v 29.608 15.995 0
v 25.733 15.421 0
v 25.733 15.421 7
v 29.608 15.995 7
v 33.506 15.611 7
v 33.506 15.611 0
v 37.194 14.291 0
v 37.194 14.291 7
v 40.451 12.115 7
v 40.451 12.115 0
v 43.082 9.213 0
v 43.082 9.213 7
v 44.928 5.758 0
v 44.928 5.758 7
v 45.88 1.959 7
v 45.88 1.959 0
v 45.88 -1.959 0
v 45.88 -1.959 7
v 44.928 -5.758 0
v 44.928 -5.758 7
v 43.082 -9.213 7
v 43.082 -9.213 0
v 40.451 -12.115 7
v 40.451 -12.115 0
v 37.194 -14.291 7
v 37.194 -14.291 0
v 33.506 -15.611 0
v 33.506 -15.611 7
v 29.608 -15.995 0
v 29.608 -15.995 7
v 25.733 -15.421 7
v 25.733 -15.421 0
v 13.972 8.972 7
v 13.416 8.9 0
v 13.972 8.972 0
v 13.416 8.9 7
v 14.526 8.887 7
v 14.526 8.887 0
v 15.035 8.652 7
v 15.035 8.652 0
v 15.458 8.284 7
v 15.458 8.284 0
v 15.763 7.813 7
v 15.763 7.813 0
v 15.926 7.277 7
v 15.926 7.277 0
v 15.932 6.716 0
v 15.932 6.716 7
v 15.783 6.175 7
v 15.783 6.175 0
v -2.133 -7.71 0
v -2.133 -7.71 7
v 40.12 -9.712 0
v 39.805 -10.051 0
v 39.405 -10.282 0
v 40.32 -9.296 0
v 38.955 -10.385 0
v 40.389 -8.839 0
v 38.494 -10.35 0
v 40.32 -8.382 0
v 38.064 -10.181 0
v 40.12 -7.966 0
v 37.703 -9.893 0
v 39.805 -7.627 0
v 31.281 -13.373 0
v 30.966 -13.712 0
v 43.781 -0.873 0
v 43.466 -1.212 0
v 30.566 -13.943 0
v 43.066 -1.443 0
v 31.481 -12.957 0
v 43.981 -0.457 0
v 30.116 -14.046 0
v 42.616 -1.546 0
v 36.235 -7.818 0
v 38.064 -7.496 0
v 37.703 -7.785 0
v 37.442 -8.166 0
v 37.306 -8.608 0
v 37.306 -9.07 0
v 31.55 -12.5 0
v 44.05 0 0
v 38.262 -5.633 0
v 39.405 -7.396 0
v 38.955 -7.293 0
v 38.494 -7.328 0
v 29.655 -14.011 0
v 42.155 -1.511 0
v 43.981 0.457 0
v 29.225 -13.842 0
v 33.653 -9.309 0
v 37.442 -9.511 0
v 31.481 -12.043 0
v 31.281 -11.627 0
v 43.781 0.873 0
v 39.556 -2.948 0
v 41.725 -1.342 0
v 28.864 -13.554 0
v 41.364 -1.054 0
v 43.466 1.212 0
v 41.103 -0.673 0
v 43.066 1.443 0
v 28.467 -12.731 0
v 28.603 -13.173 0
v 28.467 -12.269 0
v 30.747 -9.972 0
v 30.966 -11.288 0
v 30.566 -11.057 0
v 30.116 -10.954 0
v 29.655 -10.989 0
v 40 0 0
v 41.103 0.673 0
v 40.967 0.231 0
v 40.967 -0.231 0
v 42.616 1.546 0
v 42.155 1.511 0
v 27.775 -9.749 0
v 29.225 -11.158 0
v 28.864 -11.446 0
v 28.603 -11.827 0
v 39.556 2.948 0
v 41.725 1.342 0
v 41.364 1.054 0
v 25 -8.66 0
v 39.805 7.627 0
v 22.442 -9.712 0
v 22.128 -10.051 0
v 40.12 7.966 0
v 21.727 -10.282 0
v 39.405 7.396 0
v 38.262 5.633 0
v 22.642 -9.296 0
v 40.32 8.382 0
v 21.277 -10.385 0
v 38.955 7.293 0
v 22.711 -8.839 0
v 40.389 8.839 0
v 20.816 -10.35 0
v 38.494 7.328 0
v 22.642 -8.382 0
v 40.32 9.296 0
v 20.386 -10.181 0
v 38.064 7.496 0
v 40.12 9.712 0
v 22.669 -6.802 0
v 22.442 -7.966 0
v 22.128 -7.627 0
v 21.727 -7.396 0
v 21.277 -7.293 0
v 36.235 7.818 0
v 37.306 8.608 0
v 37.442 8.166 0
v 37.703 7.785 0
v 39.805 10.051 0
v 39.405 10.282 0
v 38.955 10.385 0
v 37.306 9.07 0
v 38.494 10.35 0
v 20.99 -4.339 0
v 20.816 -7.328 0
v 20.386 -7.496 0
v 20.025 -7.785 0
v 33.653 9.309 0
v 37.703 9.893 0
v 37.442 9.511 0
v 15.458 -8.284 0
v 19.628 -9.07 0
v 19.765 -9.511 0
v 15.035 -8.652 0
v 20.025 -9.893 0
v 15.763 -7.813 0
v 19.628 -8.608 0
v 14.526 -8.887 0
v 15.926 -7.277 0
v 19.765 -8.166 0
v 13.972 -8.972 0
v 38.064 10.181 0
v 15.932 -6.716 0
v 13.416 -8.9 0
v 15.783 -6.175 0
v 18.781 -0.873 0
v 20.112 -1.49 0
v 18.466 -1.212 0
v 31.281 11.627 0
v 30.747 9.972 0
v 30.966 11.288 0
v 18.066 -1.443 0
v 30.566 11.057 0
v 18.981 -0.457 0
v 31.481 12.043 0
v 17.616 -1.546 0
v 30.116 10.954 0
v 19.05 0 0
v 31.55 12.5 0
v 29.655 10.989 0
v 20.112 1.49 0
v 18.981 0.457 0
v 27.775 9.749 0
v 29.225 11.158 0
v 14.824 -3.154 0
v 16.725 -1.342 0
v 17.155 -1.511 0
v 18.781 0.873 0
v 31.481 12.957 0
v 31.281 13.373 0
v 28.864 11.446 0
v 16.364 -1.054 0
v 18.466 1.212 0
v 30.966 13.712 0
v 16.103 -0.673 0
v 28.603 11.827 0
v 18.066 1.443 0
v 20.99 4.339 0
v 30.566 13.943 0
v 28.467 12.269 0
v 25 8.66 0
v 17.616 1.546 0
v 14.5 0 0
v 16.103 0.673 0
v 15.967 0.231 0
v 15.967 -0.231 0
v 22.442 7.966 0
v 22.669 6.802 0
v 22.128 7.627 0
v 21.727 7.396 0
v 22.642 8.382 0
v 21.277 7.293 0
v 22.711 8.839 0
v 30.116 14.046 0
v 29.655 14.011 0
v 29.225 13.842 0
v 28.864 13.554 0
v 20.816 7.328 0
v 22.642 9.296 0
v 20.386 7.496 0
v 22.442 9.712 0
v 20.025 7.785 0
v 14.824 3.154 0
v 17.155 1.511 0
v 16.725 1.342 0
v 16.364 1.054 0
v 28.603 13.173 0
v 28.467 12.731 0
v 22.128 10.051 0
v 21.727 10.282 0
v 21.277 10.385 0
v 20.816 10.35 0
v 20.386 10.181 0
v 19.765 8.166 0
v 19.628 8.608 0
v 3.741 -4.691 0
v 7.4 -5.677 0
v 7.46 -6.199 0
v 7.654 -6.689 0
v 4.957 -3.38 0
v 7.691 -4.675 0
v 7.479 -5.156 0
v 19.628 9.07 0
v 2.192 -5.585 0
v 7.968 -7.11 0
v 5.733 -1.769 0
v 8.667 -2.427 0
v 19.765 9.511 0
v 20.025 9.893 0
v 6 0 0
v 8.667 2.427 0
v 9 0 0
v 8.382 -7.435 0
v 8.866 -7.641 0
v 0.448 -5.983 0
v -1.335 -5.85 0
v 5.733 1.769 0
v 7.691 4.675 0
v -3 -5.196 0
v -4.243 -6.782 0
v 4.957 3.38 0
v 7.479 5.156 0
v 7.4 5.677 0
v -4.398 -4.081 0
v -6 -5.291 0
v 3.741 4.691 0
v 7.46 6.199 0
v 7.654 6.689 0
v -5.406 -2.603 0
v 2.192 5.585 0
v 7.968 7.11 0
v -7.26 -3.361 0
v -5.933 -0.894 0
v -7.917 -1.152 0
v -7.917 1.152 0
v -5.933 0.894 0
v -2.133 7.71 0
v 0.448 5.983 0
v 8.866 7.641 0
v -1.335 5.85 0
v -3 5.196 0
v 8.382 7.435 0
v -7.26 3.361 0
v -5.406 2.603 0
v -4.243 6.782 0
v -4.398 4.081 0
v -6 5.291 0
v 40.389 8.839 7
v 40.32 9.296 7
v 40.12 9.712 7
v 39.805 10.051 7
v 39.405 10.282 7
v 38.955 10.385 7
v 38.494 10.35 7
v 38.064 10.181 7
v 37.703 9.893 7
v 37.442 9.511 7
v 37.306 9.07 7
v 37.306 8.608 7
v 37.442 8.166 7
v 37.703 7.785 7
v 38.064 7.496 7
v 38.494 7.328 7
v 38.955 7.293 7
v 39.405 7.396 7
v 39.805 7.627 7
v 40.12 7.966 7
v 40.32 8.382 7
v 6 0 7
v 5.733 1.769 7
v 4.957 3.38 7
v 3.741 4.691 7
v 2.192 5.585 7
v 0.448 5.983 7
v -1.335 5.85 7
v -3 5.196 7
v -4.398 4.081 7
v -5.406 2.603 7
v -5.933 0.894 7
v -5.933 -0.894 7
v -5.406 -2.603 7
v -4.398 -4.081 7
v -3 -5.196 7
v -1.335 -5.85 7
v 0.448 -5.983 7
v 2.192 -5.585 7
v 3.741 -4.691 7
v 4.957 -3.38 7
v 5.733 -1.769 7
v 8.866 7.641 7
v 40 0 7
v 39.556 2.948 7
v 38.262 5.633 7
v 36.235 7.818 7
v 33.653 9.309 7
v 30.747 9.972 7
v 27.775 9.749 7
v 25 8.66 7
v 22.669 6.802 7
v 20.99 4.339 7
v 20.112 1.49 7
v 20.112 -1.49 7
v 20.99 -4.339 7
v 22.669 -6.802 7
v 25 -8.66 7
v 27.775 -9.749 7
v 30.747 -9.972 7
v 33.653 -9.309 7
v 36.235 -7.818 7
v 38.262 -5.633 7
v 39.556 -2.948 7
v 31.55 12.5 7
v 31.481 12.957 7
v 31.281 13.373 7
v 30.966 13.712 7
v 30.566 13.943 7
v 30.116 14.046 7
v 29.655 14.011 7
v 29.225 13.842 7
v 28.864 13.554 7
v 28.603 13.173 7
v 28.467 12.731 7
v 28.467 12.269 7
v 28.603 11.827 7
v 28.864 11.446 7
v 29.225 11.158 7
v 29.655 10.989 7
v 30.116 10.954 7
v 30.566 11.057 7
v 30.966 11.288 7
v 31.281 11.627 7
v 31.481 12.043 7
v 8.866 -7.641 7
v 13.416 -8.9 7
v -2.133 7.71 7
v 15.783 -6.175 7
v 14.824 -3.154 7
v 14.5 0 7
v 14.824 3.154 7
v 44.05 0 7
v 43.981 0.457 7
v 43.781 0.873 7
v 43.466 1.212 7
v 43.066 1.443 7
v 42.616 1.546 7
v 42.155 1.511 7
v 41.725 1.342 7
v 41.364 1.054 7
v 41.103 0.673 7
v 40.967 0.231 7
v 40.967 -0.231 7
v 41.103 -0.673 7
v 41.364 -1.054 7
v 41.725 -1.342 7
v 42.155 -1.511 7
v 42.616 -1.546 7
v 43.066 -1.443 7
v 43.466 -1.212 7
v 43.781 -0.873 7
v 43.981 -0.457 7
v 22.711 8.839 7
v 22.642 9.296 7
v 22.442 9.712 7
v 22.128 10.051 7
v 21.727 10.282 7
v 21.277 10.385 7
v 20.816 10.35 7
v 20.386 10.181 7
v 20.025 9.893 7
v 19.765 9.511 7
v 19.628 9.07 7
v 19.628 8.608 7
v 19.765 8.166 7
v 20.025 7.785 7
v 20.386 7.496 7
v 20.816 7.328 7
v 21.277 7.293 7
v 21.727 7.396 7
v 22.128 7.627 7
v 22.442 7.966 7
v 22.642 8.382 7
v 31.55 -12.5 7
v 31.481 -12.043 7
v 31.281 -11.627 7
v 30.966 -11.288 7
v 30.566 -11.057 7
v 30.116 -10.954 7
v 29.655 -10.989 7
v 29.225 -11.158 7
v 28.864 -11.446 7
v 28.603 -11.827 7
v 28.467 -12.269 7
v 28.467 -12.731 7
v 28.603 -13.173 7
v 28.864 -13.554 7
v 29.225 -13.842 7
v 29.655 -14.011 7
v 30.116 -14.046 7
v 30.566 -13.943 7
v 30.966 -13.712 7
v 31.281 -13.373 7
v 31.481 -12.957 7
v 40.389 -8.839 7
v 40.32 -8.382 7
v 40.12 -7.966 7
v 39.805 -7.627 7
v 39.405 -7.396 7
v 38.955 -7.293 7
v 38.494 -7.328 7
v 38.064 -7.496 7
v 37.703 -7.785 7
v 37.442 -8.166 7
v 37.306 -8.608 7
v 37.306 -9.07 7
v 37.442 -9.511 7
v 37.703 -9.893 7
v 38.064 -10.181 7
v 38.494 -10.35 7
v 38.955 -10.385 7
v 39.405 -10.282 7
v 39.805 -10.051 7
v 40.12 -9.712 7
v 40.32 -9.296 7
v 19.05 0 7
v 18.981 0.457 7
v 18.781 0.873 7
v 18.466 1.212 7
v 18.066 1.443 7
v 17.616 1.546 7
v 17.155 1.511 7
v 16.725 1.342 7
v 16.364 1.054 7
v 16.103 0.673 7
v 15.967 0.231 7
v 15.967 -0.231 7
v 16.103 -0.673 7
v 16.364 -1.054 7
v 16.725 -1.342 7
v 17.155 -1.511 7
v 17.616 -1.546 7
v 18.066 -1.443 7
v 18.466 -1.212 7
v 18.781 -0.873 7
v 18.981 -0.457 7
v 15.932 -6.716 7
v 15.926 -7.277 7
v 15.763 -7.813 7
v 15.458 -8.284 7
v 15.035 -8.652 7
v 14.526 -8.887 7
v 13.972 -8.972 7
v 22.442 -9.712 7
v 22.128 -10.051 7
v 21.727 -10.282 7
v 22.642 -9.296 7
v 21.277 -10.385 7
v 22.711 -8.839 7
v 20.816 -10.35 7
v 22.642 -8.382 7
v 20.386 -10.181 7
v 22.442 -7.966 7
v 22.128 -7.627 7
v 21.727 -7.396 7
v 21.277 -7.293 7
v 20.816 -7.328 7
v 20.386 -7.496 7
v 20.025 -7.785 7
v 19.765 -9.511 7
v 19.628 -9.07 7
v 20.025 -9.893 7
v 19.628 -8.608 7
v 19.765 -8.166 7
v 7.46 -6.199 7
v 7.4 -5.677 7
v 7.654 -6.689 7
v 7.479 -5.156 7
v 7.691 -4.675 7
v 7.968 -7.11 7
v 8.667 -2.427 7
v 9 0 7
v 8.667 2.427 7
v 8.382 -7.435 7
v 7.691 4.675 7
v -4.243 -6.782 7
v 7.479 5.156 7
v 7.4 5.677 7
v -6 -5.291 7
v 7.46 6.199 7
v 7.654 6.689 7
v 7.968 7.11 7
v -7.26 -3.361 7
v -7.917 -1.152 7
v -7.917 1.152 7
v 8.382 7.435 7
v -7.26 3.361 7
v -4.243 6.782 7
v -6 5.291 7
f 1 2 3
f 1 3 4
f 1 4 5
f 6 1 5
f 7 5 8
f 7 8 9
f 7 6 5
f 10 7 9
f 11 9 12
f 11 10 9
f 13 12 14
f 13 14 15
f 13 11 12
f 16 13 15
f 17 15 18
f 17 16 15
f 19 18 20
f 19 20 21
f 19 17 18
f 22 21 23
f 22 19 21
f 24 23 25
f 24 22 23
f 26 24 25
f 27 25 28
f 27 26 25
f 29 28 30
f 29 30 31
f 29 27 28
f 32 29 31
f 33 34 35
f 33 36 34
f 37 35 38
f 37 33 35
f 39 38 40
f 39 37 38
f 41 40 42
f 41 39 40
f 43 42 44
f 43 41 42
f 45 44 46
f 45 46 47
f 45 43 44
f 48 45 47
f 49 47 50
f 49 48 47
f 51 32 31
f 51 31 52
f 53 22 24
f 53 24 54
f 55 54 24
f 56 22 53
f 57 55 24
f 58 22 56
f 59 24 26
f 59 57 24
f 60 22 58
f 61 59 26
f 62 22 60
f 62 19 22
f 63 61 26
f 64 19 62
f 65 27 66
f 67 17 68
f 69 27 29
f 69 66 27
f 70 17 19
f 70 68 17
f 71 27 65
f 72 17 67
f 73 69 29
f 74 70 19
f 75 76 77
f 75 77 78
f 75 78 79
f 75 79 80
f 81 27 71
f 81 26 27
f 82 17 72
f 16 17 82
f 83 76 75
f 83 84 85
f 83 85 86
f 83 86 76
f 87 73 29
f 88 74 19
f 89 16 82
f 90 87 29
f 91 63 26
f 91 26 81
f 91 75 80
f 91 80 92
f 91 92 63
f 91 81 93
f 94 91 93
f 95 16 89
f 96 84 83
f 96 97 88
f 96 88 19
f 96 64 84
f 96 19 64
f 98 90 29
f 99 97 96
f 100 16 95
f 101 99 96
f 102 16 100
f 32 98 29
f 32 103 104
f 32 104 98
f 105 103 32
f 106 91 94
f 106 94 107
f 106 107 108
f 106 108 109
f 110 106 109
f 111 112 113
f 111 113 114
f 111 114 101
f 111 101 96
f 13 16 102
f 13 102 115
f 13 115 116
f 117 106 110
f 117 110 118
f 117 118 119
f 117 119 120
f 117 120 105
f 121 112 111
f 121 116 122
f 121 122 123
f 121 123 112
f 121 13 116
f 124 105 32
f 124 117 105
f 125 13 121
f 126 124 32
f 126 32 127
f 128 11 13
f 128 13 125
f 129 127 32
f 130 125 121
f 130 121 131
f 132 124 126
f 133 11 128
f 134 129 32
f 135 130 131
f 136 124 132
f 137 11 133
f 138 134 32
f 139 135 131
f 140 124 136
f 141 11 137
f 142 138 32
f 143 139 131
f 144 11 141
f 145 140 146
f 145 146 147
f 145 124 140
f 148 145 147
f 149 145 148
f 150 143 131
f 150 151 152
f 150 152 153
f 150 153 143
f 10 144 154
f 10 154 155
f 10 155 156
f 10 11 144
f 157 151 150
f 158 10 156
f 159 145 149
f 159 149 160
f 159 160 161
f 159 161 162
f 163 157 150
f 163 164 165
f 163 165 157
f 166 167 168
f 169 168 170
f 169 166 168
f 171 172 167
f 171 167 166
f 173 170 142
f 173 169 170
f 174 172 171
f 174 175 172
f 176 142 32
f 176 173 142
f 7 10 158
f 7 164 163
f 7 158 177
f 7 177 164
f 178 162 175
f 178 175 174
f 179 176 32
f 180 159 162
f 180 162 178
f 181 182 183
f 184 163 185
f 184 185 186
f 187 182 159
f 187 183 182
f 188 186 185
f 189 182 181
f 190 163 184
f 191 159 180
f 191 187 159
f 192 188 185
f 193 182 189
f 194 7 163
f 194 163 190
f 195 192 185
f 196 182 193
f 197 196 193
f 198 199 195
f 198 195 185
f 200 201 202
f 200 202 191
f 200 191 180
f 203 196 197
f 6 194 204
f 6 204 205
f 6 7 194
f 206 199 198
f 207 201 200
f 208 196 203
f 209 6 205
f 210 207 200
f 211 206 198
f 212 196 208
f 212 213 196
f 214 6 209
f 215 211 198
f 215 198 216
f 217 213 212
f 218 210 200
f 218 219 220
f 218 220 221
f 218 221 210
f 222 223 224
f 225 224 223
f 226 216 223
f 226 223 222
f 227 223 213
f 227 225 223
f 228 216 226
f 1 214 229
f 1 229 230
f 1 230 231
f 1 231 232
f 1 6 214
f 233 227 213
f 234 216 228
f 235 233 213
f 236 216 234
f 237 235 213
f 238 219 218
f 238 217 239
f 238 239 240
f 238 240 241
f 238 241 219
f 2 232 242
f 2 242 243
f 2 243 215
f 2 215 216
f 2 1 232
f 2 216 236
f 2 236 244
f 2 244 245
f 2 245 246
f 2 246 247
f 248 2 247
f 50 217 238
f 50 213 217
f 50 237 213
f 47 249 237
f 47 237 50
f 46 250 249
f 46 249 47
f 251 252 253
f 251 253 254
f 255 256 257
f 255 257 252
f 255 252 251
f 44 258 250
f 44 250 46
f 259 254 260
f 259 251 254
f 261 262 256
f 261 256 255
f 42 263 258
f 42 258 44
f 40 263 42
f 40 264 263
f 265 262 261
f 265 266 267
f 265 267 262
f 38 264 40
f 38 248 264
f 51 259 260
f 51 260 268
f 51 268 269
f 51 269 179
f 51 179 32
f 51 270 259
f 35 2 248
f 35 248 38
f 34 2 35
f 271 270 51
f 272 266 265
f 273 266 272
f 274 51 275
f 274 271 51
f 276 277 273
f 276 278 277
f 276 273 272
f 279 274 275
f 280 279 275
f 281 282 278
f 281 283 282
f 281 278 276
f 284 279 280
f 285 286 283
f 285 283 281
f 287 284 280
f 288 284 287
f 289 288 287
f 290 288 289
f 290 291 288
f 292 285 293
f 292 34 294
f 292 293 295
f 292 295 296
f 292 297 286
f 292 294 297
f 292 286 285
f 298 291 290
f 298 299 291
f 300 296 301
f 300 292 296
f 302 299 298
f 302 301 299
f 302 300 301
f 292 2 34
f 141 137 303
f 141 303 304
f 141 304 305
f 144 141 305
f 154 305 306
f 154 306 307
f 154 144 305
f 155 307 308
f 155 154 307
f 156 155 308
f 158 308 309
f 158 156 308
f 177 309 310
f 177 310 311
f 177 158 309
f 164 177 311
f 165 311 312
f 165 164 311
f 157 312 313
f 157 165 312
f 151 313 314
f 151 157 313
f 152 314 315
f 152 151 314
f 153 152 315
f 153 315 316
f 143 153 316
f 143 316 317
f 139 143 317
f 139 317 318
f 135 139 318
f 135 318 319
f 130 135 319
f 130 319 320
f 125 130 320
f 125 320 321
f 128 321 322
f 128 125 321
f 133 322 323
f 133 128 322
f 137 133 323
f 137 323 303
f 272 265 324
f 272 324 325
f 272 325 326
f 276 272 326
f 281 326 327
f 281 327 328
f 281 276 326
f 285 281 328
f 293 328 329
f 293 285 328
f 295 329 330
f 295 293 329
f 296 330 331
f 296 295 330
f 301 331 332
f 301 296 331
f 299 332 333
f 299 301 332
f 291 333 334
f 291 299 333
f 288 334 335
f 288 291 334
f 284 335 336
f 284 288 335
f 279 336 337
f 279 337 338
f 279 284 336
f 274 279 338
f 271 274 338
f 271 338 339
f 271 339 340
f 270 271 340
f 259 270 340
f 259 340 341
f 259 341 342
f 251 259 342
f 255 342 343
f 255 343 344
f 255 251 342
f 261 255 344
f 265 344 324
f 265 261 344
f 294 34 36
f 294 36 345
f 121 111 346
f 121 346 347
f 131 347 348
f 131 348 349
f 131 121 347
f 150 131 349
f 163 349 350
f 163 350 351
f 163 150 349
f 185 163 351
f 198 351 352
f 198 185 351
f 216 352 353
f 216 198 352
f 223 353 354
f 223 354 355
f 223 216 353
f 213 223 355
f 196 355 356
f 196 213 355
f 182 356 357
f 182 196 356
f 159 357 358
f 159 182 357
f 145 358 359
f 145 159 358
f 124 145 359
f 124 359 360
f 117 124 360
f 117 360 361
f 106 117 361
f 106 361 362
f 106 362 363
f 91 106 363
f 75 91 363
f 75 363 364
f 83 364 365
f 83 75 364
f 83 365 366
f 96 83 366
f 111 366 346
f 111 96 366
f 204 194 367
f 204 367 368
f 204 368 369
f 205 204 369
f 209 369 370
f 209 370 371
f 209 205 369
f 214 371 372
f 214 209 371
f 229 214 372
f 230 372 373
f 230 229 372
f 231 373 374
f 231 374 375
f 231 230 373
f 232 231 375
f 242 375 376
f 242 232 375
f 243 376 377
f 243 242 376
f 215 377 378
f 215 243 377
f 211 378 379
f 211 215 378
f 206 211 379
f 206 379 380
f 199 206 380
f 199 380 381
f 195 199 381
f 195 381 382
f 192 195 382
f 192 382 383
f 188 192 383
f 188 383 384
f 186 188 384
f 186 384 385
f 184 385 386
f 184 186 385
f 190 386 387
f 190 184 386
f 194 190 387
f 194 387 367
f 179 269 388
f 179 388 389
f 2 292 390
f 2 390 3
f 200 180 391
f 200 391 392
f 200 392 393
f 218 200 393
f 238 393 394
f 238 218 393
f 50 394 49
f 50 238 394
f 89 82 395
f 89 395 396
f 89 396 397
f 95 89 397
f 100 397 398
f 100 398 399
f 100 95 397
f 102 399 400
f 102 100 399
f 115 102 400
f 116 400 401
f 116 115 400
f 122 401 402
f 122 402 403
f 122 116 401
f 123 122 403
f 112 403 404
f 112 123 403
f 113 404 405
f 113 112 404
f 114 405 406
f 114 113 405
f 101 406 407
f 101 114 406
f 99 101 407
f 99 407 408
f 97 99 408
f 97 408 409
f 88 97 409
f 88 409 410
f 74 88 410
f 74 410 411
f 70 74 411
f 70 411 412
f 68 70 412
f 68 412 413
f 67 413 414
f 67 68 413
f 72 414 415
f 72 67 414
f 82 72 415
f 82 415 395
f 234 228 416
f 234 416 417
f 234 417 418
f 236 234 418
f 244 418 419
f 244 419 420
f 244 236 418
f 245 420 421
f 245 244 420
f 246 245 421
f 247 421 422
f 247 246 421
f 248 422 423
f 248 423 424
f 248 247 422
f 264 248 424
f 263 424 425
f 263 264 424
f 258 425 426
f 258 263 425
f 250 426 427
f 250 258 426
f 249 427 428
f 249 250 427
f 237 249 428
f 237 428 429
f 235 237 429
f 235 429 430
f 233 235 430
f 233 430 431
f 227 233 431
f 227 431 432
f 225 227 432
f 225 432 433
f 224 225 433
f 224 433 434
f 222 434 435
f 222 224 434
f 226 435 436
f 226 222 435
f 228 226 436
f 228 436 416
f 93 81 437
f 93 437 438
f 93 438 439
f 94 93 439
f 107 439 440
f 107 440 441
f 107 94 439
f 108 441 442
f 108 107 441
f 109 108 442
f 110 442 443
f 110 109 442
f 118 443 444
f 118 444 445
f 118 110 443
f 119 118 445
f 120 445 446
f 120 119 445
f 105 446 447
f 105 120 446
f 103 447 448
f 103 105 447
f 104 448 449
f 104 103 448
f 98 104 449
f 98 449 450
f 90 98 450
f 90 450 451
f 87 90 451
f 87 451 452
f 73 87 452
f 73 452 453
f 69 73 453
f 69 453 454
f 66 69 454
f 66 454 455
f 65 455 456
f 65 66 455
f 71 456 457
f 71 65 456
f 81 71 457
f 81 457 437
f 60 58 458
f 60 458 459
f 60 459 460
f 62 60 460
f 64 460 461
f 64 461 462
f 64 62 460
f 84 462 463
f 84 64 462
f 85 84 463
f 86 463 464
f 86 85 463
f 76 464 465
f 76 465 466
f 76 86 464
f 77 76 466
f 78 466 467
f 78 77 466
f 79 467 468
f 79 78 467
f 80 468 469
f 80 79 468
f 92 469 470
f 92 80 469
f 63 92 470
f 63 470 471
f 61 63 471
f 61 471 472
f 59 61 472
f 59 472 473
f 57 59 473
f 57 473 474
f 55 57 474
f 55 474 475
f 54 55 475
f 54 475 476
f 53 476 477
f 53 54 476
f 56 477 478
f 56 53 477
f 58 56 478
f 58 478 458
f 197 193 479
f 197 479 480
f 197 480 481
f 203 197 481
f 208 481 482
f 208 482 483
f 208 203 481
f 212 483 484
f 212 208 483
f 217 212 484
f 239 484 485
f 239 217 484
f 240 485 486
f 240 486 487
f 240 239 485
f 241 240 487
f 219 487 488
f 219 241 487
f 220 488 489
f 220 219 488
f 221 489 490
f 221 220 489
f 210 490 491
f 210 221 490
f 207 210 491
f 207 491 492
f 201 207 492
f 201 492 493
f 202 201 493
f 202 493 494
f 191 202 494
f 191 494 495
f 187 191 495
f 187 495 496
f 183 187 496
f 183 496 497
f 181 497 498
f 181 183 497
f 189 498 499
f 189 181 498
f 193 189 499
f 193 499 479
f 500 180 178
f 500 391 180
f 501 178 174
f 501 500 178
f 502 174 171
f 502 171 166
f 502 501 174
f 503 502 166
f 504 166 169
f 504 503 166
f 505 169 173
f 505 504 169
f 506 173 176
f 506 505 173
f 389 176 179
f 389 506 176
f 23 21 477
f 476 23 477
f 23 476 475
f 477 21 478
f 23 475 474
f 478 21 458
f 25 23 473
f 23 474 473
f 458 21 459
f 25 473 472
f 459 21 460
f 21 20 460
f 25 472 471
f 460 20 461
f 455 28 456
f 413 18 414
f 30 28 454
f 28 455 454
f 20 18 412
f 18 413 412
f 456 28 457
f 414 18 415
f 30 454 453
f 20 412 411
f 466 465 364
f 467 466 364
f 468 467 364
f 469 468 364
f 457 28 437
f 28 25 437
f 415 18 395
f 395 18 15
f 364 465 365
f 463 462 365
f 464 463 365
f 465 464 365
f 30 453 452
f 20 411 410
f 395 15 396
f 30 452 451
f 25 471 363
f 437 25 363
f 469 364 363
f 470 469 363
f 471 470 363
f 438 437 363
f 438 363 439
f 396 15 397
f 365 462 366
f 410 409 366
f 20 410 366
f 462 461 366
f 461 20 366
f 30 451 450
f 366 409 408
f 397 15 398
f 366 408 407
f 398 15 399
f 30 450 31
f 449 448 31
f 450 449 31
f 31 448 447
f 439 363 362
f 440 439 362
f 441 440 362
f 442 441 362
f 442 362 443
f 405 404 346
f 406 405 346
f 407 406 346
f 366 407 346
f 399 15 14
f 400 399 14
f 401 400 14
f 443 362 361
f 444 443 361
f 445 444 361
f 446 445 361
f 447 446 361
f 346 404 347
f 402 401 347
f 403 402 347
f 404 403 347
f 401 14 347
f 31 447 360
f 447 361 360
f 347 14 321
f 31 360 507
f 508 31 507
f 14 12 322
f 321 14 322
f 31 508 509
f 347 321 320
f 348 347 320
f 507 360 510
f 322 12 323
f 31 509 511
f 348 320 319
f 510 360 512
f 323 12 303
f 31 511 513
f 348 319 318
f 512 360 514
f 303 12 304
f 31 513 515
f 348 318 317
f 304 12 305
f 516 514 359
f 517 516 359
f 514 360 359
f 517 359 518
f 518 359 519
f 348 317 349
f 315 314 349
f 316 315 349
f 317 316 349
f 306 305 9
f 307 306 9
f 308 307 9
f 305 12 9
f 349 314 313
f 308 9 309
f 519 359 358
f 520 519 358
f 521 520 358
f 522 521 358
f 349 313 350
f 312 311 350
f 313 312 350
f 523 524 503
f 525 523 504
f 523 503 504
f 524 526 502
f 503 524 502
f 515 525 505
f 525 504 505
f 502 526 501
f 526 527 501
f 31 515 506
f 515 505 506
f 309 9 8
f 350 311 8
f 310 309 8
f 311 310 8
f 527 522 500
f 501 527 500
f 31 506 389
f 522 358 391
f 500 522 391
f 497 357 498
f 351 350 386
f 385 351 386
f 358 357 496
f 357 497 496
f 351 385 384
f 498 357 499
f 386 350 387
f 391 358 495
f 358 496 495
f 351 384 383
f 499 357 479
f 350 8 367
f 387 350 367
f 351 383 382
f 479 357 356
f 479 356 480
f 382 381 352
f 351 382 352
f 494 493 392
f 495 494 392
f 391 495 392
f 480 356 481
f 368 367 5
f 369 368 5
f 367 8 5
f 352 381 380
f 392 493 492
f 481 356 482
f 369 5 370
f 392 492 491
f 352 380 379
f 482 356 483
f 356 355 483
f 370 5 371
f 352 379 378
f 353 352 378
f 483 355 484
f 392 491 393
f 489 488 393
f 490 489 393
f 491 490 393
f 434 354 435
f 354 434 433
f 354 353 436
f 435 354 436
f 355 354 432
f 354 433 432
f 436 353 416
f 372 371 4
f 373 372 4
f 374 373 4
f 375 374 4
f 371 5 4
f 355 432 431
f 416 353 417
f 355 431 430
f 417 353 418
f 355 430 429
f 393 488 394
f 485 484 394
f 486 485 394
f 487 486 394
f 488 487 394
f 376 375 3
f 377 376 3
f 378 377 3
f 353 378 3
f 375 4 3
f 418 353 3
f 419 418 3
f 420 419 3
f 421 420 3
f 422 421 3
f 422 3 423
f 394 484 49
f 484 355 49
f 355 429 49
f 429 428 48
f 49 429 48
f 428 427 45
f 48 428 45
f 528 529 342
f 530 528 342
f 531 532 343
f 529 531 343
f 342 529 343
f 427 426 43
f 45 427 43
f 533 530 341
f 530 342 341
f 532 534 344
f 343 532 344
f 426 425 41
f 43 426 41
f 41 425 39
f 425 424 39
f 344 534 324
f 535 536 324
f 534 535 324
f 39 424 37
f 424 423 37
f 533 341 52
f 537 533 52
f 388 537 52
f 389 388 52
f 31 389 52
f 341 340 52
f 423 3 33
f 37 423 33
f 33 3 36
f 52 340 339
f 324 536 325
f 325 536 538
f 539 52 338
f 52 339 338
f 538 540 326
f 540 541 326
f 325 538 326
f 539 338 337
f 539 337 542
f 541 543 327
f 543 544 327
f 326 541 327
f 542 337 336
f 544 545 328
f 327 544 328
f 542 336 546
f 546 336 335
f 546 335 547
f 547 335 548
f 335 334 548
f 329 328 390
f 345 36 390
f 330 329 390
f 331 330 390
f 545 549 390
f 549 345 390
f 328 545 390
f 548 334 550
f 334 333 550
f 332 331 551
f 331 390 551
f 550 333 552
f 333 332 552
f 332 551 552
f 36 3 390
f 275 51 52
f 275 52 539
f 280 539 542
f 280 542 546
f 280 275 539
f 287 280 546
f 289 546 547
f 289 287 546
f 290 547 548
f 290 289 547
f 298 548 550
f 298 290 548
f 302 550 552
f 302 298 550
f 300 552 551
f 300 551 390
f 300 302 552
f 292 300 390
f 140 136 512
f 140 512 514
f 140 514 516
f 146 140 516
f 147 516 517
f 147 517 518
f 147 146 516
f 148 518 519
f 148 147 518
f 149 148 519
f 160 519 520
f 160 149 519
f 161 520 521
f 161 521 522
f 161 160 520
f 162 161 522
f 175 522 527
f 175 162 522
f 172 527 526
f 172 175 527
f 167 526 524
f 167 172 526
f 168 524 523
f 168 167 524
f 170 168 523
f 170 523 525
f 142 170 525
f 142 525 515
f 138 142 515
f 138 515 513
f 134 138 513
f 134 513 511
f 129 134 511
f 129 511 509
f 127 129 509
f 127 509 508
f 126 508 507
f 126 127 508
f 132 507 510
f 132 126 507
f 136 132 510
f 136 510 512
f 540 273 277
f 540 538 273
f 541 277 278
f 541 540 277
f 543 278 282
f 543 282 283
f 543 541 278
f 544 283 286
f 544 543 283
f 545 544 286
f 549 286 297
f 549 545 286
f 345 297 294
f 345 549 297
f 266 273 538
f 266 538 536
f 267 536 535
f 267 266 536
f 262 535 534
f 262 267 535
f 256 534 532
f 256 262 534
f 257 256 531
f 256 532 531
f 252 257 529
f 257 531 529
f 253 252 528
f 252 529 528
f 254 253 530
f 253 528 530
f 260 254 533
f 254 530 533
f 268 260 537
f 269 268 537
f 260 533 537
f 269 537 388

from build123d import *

# Parameters (mm, degrees)
SKETCH_1_R      = 6
SKETCH_1_R_2    = 10
SKETCH_1_R_3    = 1.55
EXTRUDE_1_DEPTH = 7
FILLET_1_R      = 2


with BuildPart() as part:
    # 草图1 → 凸台-拉伸1 (new body)
    with BuildSketch(Plane.XY):
        with BuildLine():
            Line((25.733333333, -15.420621114), (-2.133333333, -7.710310557))
            ThreePointArc((-2.133333333, -7.710310557), (-8, 0), (-2.133333333, 7.710310557))
            Line((-2.133333333, 7.710310557), (25.733333333, 15.420621114))
            ThreePointArc((25.733333333, 15.420621114), (46, 0), (25.733333333, -15.420621114))
        make_face()
        Circle(SKETCH_1_R, mode=Mode.SUBTRACT)
        with Locations((30, 0)):
            Circle(SKETCH_1_R_2, mode=Mode.SUBTRACT)
        with Locations((30, -12.5)):
            Circle(SKETCH_1_R_3, mode=Mode.SUBTRACT)
        with Locations((21.161165235, -8.838834765)):
            Circle(SKETCH_1_R_3, mode=Mode.SUBTRACT)
        with Locations((17.5, 0)):
            Circle(SKETCH_1_R_3, mode=Mode.SUBTRACT)
        with Locations((21.161165235, 8.838834765)):
            Circle(SKETCH_1_R_3, mode=Mode.SUBTRACT)
        with Locations((30, 12.5)):
            Circle(SKETCH_1_R_3, mode=Mode.SUBTRACT)
        with Locations((38.838834765, 8.838834765)):
            Circle(SKETCH_1_R_3, mode=Mode.SUBTRACT)
        with Locations((42.5, 0)):
            Circle(SKETCH_1_R_3, mode=Mode.SUBTRACT)
        with Locations((38.838834765, -8.838834765)):
            Circle(SKETCH_1_R_3, mode=Mode.SUBTRACT)
        with BuildLine():
            Line((5.879001779, -6.814494705), (18.398019367, -10.27832892))
            ThreePointArc((18.398019367, -10.27832892), (14.5, 0), (18.398019367, 10.27832892))
            Line((18.398019367, 10.27832892), (5.879001779, 6.814494705))
            ThreePointArc((5.879001779, 6.814494705), (9, 0), (5.879001779, -6.814494705))
        make_face(mode=Mode.SUBTRACT)
    extrude(amount=EXTRUDE_1_DEPTH)

    # 圆角1
    fillet_1_edges = [part.edges().sort_by_distance(p)[0] for p in [
        (5.879001779, 6.814494705, 3.5),
        (5.879001779, -6.814494705, 3.5),
        (18.398019367, -10.27832892, 3.5),
        (18.398019367, 10.27832892, 3.5),
    ]]
    fillet(fillet_1_edges, radius=FILLET_1_R)


solid = part.part
